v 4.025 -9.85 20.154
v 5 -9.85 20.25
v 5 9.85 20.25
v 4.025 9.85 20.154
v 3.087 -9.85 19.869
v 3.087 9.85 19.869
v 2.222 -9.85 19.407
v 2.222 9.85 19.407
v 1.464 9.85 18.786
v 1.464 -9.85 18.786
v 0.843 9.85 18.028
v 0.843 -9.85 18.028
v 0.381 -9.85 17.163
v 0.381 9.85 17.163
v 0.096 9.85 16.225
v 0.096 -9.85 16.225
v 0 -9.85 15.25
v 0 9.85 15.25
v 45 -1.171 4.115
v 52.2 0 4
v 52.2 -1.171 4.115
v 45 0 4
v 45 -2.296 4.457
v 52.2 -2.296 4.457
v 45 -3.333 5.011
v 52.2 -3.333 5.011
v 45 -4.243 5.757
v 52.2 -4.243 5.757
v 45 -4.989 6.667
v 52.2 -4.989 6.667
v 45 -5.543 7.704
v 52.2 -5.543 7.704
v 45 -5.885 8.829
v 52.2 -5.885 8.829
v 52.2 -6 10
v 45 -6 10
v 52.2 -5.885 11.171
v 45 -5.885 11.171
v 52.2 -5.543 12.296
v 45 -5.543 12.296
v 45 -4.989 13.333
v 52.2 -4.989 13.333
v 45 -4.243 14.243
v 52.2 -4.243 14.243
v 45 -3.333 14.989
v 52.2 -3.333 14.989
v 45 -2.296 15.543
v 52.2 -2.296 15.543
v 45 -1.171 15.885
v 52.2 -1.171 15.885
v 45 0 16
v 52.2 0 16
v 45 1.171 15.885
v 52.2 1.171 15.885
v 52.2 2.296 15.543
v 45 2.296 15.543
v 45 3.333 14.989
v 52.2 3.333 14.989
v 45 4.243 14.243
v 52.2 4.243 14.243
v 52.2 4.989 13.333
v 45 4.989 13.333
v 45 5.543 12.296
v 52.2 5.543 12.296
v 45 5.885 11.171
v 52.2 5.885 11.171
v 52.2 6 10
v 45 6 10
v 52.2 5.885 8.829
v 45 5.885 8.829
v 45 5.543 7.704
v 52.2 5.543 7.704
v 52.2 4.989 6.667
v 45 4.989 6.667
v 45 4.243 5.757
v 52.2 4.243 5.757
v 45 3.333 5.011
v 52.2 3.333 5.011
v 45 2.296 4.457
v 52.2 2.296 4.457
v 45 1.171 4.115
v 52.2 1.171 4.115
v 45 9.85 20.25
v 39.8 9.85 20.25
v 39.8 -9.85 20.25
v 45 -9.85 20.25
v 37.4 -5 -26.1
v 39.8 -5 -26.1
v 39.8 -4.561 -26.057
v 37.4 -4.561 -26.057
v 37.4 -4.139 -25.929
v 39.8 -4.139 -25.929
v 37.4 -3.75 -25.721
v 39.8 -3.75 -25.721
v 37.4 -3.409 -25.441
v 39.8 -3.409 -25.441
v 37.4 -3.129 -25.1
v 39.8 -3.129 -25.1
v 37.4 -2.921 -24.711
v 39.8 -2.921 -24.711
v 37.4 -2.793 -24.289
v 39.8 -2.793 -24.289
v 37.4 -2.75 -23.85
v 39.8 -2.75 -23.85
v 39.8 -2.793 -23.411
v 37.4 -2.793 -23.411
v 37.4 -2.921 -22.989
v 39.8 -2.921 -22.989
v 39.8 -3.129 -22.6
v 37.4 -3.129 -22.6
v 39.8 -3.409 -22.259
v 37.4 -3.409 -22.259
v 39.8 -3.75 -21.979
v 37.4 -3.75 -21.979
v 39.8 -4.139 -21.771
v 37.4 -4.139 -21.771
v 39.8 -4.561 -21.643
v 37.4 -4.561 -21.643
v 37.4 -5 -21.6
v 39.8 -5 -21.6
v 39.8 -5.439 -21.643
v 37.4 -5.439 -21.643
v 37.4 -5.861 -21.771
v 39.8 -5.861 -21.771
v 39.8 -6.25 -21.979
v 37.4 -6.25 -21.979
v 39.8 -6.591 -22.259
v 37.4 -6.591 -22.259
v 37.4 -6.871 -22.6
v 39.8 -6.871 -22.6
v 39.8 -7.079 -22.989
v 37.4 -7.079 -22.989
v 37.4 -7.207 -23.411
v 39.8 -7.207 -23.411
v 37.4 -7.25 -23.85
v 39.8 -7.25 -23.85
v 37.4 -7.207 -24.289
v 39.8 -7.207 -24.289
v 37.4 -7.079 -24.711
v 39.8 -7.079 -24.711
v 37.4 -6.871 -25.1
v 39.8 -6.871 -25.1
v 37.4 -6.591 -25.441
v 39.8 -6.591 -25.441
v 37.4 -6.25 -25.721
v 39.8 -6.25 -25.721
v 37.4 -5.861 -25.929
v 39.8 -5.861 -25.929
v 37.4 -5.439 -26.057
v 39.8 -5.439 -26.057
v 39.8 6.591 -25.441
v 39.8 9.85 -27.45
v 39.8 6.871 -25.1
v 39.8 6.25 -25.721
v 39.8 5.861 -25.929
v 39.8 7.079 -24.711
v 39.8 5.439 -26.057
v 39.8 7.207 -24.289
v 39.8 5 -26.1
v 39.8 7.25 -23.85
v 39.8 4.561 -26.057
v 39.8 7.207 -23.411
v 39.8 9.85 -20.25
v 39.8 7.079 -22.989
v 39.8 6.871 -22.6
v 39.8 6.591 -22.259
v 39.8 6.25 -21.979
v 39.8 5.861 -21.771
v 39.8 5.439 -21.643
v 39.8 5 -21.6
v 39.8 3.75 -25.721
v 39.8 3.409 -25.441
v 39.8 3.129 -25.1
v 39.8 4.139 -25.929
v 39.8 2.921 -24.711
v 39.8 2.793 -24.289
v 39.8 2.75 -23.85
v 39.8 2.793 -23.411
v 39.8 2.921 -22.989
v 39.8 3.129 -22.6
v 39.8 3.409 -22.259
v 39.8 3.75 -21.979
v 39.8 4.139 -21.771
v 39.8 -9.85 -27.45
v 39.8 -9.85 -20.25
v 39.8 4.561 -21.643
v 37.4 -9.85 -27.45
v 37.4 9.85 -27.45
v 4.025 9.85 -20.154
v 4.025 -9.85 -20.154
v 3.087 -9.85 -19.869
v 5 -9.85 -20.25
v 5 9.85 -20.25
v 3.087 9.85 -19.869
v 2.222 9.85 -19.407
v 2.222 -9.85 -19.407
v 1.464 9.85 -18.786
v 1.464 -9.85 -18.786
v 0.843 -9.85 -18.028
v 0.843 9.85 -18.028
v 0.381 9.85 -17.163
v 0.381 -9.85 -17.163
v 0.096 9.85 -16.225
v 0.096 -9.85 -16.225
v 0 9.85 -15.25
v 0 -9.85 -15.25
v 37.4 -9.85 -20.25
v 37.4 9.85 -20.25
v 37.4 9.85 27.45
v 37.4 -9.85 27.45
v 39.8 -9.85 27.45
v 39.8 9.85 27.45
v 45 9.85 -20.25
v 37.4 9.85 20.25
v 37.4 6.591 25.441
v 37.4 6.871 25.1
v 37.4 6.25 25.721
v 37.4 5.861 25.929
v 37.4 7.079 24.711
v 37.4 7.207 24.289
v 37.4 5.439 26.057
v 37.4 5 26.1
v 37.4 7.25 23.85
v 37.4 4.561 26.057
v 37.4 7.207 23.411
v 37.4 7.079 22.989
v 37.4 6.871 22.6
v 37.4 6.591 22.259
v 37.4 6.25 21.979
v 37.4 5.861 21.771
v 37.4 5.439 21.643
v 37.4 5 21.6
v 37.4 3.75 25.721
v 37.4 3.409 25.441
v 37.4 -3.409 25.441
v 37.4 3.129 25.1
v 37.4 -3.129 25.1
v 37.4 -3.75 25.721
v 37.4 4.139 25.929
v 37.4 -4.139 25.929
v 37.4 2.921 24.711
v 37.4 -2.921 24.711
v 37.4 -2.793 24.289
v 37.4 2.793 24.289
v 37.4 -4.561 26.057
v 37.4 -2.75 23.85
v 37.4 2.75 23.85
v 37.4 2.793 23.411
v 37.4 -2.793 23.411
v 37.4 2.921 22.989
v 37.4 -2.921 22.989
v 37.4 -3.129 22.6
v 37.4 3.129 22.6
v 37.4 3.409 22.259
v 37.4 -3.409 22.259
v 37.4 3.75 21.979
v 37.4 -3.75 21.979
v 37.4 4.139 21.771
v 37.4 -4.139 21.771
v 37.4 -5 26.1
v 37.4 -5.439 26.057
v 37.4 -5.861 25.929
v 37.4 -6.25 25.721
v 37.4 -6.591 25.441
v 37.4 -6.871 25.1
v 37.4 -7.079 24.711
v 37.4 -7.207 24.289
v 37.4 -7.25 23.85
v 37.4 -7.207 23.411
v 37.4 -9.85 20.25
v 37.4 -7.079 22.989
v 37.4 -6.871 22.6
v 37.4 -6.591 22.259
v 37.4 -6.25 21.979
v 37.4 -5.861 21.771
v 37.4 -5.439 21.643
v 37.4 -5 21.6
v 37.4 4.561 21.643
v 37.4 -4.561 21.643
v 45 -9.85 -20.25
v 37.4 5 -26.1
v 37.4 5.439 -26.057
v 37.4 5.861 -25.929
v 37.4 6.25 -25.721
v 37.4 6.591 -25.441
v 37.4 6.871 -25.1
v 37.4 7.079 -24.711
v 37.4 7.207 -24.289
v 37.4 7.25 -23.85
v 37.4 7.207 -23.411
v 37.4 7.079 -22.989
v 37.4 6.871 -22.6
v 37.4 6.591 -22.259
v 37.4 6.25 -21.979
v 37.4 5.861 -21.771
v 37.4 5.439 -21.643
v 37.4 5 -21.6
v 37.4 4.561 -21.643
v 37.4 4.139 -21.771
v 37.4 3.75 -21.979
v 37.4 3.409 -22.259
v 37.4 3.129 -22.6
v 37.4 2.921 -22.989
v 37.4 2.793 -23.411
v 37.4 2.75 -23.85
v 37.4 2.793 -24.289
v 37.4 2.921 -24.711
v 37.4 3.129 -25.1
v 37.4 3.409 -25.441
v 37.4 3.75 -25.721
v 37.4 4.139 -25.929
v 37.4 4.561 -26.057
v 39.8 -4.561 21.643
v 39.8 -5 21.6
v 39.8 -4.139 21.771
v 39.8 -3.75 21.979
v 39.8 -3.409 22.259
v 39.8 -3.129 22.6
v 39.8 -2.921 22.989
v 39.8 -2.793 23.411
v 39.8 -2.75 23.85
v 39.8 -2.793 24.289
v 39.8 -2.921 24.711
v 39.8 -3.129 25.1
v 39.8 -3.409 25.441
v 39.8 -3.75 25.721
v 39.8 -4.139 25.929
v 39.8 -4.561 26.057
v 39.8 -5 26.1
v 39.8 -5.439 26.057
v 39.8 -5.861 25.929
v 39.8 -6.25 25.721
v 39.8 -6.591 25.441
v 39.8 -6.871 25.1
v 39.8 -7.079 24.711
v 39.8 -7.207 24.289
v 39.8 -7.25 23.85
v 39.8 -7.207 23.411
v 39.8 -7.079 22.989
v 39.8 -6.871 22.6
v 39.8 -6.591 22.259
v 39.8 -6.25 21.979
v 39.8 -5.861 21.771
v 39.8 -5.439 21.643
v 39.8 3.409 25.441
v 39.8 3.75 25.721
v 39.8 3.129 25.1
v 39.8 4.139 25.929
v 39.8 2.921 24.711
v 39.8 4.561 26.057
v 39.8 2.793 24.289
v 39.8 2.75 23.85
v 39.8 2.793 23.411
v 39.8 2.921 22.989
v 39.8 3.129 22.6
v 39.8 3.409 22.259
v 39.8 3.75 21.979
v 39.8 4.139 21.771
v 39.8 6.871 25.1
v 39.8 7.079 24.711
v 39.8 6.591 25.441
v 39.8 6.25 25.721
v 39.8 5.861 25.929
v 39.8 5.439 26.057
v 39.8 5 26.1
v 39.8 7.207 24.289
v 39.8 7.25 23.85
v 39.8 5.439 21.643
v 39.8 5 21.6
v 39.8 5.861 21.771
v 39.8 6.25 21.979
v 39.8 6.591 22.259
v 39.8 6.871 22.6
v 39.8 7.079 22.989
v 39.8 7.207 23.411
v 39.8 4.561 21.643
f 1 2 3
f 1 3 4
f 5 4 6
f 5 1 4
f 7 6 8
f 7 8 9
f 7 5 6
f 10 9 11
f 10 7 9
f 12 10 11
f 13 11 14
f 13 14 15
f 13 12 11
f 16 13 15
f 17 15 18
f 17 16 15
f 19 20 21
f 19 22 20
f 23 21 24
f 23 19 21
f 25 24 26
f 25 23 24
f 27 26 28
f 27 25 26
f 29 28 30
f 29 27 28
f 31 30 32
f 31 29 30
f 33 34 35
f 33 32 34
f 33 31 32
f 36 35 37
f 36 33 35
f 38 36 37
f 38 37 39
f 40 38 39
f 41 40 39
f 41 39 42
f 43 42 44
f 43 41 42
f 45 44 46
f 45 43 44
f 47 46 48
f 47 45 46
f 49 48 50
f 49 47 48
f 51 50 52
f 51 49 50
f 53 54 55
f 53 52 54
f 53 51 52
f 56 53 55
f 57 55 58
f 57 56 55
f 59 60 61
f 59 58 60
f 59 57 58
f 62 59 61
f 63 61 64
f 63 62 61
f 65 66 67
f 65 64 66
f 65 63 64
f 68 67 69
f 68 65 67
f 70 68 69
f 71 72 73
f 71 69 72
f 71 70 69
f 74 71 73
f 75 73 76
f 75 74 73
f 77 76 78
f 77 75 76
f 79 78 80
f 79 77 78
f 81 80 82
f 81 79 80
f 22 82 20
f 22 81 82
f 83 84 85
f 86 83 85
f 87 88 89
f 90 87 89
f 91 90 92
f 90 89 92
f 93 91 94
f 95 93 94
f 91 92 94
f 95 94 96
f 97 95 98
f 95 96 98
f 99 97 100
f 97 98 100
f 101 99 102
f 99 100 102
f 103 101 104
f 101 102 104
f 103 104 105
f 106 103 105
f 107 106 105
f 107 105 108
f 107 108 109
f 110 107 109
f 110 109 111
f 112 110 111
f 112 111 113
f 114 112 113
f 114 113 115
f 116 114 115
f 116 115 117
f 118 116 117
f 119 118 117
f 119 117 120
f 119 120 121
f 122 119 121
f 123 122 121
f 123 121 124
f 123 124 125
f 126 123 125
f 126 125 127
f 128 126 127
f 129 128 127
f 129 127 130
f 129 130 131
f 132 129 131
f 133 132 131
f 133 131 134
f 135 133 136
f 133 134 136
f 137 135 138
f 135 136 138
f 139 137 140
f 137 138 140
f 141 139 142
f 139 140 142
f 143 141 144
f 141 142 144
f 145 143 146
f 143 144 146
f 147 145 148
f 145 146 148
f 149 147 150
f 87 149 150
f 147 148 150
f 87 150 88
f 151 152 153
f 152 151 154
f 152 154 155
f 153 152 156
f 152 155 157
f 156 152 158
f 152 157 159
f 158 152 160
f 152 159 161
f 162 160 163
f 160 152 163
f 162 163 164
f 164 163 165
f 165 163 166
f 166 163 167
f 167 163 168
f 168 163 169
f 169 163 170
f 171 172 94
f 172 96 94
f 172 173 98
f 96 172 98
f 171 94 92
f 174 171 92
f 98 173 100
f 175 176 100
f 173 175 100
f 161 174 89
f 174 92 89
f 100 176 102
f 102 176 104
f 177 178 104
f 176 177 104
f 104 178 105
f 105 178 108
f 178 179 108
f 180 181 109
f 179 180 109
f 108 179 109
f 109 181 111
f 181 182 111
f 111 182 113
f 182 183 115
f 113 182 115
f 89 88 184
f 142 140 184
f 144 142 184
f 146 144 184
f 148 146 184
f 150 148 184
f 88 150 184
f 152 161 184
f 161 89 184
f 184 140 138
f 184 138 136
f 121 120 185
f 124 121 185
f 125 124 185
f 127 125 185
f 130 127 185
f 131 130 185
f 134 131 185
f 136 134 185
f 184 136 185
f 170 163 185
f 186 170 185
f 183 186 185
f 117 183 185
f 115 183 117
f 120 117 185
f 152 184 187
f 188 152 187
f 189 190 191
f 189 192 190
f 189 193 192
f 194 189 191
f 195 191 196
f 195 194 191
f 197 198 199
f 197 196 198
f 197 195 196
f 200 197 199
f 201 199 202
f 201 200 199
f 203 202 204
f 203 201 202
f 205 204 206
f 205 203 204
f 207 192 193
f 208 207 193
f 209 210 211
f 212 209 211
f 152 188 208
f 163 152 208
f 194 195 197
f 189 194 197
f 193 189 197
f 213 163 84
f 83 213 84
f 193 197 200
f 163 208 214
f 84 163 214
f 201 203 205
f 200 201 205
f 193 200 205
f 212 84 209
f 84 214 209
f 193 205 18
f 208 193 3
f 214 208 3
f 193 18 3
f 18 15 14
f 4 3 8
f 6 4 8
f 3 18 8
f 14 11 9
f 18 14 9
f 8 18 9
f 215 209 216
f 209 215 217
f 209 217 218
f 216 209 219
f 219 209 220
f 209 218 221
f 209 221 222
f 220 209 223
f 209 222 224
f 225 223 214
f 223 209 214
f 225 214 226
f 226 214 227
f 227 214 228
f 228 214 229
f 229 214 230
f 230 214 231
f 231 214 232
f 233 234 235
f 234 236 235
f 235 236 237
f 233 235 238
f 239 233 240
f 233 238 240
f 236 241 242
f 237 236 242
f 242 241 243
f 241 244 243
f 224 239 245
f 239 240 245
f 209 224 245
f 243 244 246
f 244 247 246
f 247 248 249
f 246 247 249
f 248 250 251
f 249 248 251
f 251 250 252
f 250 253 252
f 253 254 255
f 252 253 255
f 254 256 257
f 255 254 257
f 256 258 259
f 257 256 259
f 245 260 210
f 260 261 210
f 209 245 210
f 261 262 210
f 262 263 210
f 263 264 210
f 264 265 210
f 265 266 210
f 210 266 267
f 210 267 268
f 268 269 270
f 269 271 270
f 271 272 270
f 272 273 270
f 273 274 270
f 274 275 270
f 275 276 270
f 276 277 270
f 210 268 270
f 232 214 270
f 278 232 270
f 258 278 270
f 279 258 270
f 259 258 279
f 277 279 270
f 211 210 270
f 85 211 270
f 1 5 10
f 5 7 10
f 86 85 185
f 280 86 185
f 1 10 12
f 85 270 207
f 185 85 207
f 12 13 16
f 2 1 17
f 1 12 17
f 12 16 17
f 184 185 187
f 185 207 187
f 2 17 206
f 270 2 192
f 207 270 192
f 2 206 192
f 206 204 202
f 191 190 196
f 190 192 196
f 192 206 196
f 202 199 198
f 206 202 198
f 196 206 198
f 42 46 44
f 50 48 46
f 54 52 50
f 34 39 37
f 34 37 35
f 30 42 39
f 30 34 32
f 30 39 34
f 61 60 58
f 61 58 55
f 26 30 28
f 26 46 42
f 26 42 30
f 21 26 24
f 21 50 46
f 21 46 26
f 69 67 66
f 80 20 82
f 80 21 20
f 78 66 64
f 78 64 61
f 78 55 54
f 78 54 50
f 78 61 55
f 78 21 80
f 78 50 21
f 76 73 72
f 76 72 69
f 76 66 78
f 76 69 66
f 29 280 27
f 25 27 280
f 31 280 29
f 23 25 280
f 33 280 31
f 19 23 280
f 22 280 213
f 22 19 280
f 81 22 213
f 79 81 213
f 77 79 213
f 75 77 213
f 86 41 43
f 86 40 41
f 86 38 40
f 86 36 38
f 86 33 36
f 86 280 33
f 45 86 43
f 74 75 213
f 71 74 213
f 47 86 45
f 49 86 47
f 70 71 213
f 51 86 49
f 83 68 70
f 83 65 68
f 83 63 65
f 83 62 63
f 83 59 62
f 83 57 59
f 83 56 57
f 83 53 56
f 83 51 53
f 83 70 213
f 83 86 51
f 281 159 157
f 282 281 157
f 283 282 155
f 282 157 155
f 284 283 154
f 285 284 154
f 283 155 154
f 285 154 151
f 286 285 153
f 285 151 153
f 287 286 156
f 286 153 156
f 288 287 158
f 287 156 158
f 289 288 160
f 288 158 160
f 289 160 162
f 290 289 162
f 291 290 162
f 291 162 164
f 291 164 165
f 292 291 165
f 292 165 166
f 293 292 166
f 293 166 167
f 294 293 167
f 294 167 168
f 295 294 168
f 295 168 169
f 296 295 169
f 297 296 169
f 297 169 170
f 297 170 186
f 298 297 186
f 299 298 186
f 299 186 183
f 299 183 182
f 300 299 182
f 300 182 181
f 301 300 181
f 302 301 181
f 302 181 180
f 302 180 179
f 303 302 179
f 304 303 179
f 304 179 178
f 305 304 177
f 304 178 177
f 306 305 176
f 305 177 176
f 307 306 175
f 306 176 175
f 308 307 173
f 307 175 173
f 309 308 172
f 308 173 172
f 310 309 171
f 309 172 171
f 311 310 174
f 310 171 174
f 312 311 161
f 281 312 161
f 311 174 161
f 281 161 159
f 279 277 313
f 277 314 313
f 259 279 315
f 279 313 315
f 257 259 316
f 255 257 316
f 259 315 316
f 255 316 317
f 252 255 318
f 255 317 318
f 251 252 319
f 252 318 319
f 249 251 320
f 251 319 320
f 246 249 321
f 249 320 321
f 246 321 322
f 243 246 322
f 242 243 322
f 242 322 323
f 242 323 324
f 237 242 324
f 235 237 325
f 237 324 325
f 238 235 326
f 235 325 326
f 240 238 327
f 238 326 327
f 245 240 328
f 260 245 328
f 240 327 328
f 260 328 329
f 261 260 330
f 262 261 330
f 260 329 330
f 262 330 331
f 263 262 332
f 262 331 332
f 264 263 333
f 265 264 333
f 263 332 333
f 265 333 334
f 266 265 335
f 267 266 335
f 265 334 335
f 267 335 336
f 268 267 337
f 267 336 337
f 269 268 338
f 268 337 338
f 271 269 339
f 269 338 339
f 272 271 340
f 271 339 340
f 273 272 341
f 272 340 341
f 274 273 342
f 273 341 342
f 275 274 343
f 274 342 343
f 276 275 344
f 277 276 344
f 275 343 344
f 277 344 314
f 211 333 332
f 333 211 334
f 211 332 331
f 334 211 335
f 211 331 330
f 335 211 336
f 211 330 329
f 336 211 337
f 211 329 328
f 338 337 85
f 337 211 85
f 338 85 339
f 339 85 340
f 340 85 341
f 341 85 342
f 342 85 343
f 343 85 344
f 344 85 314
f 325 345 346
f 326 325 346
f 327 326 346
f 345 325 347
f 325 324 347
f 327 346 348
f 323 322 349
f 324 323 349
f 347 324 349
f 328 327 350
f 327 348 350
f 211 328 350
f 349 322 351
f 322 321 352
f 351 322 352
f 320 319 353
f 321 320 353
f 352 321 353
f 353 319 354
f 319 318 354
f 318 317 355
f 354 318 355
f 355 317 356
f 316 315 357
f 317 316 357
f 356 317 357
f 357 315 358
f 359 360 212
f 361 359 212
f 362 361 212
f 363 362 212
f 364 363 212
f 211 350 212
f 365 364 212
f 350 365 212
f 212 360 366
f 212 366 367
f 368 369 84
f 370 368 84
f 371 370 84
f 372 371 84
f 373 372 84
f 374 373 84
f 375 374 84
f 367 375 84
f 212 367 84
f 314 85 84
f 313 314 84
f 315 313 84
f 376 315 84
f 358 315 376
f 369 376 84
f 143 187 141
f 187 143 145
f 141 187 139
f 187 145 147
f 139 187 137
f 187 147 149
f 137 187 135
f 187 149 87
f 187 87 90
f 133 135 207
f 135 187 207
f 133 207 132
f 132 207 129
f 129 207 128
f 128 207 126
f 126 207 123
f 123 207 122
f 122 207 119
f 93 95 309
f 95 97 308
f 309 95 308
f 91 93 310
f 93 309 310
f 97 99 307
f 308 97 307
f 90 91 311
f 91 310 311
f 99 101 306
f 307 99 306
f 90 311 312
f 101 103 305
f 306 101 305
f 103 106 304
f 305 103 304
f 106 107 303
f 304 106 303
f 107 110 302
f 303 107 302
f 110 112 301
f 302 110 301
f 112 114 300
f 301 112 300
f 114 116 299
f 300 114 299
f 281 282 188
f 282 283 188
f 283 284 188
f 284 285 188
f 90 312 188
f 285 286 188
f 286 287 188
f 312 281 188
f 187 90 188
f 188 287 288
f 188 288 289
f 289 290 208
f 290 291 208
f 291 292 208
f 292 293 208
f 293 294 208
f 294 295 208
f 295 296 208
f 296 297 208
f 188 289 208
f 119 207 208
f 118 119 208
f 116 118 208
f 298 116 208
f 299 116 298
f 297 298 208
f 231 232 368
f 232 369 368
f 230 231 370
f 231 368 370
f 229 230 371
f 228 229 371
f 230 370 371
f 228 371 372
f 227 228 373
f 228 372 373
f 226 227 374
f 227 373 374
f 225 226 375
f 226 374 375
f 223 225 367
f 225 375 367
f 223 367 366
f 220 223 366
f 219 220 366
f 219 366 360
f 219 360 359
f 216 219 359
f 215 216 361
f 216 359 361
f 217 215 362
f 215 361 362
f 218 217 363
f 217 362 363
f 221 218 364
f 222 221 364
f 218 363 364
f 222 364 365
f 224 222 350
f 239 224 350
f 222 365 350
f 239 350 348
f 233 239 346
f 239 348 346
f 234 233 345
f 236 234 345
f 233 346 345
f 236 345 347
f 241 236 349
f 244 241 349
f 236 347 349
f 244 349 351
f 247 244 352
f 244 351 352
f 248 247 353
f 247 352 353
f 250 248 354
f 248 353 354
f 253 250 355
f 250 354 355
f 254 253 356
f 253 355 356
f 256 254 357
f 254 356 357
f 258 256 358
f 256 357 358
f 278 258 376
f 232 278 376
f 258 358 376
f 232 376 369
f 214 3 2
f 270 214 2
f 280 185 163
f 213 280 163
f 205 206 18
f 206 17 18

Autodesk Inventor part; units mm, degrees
ref_plane "YZ Plane" through (0, 0, 0) normal (1, 0, 0) x (0, 1, 0)
ref_plane "XZ Plane" through (0, 0, 0) normal (0, 1, 0) x (-1, 0, 0)
ref_plane "XY Plane" through (0, 0, 0) normal (0, 0, 1) x (1, 0, 0)
sketch "Esquisse1" plane through (0, 0, 0) normal (1, 0, 0) x (0, 1, 0)
  line L0 (9.85, 20.25) -> (-9.85, 20.25)
  line L1 (-9.85, 20.25) -> (-9.85, -20.25)
  line L2 (-9.85, -20.25) -> (9.85, -20.25)
  line L3 (9.85, -20.25) -> (9.85, 20.25)
  line L4 (9.85, 20.25) -> (-9.85, -20.25)
  line L5 (-9.85, 20.25) -> (9.85, -20.25)
  point P0 (0, 0)
  point P1 (0, 0)
  point P2 (0, 0)
  dimension "d0" = 19.7
  dimension "d1" = 40.5
extrude "Extrusion1" add sketch "Esquisse1" along normal blind 45
sketch "Esquisse2" plane through (0, -9.85, -20.25) normal (0, 0, -1) x (-1, 0, 0)
  line L0 (0, 0) -> (-45, 0) projected
  line L1 (0, 19.7) -> (-45, 19.7) projected
  line L2 (-39.8, 0) -> (-37.4, 0)
  line L3 (-37.4, 0) -> (-37.4, 19.7)
  line L4 (-37.4, 19.7) -> (-39.8, 19.7)
  line L5 (-39.8, 19.7) -> (-39.8, 0)
  line L6 (-45, 0) -> (-45, 19.7) projected
  point P0 (0, 9.85)
  dimension "d4" = 5.2
  dimension "d5" = 2.4
extrude "Extrusion2" add sketch "Esquisse2" along normal blind 7.2 contours L0 L5 L1 L3
sketch "Esquisse3" plane through (0, -9.85, 20.25) normal (0, 0, 1) x (1, 0, 0)
  line L0 (39.8, 19.7) -> (45, 19.7) projected
  line L1 (39.8, 19.7) -> (37.4, 19.7)
  line L2 (37.4, 19.7) -> (37.4, 0)
  line L3 (37.4, 0) -> (39.8, 0)
  line L4 (39.8, 0) -> (39.8, 19.7)
  point P0 (0, 9.85)
extrude "Extrusion3" add sketch "Esquisse3" along normal blind 7.2
sketch "Esquisse4" plane through (39.8, -9.85, 20.25) normal (1, 0, 0) x (0, 0, -1)
  line L0 (40.5, 19.7) -> (0, 19.7) projected
  line L1 (20.25, 19.7) -> (20.25, 0)
  line L2 (0, 0) -> (40.5, 0) projected
  circle A0 centre (-3.6, 14.85) radius 2.25
  line L3 (-7.2, 19.7) -> (-7.2, 0) projected
  line L4 (-7.2, 9.85) -> (47.7, 9.85)
  line L5 (47.7, 0) -> (47.7, 19.7) projected
  circle A1 centre (-3.6, 4.85) radius 2.25
  circle A2 centre (44.1, 14.85) radius 2.25
  circle A3 centre (44.1, 4.85) radius 2.25
  point P0 (20.25, 9.85)
  dimension "d10" = 4.5
  dimension "d11" = 10
extrude "Extrusion4" cut sketch "Esquisse4" against normal blind 7.2
sketch "Esquisse5" plane through (45, 0, 0) normal (1, 0, 0) x (0, 0, -1)
  circle A0 centre (-10, 0) radius 6
  point P0 (0, 0)
  dimension "d14" = 12
  dimension "d15" = 10
extrude "Extrusion5" add sketch "Esquisse5" along normal blind 7.2
fillet "Congé1" radius 5 2 edges at (0, 0, 20.25) (0, 0, -20.25)
properties part number "servomoteur_roues"
